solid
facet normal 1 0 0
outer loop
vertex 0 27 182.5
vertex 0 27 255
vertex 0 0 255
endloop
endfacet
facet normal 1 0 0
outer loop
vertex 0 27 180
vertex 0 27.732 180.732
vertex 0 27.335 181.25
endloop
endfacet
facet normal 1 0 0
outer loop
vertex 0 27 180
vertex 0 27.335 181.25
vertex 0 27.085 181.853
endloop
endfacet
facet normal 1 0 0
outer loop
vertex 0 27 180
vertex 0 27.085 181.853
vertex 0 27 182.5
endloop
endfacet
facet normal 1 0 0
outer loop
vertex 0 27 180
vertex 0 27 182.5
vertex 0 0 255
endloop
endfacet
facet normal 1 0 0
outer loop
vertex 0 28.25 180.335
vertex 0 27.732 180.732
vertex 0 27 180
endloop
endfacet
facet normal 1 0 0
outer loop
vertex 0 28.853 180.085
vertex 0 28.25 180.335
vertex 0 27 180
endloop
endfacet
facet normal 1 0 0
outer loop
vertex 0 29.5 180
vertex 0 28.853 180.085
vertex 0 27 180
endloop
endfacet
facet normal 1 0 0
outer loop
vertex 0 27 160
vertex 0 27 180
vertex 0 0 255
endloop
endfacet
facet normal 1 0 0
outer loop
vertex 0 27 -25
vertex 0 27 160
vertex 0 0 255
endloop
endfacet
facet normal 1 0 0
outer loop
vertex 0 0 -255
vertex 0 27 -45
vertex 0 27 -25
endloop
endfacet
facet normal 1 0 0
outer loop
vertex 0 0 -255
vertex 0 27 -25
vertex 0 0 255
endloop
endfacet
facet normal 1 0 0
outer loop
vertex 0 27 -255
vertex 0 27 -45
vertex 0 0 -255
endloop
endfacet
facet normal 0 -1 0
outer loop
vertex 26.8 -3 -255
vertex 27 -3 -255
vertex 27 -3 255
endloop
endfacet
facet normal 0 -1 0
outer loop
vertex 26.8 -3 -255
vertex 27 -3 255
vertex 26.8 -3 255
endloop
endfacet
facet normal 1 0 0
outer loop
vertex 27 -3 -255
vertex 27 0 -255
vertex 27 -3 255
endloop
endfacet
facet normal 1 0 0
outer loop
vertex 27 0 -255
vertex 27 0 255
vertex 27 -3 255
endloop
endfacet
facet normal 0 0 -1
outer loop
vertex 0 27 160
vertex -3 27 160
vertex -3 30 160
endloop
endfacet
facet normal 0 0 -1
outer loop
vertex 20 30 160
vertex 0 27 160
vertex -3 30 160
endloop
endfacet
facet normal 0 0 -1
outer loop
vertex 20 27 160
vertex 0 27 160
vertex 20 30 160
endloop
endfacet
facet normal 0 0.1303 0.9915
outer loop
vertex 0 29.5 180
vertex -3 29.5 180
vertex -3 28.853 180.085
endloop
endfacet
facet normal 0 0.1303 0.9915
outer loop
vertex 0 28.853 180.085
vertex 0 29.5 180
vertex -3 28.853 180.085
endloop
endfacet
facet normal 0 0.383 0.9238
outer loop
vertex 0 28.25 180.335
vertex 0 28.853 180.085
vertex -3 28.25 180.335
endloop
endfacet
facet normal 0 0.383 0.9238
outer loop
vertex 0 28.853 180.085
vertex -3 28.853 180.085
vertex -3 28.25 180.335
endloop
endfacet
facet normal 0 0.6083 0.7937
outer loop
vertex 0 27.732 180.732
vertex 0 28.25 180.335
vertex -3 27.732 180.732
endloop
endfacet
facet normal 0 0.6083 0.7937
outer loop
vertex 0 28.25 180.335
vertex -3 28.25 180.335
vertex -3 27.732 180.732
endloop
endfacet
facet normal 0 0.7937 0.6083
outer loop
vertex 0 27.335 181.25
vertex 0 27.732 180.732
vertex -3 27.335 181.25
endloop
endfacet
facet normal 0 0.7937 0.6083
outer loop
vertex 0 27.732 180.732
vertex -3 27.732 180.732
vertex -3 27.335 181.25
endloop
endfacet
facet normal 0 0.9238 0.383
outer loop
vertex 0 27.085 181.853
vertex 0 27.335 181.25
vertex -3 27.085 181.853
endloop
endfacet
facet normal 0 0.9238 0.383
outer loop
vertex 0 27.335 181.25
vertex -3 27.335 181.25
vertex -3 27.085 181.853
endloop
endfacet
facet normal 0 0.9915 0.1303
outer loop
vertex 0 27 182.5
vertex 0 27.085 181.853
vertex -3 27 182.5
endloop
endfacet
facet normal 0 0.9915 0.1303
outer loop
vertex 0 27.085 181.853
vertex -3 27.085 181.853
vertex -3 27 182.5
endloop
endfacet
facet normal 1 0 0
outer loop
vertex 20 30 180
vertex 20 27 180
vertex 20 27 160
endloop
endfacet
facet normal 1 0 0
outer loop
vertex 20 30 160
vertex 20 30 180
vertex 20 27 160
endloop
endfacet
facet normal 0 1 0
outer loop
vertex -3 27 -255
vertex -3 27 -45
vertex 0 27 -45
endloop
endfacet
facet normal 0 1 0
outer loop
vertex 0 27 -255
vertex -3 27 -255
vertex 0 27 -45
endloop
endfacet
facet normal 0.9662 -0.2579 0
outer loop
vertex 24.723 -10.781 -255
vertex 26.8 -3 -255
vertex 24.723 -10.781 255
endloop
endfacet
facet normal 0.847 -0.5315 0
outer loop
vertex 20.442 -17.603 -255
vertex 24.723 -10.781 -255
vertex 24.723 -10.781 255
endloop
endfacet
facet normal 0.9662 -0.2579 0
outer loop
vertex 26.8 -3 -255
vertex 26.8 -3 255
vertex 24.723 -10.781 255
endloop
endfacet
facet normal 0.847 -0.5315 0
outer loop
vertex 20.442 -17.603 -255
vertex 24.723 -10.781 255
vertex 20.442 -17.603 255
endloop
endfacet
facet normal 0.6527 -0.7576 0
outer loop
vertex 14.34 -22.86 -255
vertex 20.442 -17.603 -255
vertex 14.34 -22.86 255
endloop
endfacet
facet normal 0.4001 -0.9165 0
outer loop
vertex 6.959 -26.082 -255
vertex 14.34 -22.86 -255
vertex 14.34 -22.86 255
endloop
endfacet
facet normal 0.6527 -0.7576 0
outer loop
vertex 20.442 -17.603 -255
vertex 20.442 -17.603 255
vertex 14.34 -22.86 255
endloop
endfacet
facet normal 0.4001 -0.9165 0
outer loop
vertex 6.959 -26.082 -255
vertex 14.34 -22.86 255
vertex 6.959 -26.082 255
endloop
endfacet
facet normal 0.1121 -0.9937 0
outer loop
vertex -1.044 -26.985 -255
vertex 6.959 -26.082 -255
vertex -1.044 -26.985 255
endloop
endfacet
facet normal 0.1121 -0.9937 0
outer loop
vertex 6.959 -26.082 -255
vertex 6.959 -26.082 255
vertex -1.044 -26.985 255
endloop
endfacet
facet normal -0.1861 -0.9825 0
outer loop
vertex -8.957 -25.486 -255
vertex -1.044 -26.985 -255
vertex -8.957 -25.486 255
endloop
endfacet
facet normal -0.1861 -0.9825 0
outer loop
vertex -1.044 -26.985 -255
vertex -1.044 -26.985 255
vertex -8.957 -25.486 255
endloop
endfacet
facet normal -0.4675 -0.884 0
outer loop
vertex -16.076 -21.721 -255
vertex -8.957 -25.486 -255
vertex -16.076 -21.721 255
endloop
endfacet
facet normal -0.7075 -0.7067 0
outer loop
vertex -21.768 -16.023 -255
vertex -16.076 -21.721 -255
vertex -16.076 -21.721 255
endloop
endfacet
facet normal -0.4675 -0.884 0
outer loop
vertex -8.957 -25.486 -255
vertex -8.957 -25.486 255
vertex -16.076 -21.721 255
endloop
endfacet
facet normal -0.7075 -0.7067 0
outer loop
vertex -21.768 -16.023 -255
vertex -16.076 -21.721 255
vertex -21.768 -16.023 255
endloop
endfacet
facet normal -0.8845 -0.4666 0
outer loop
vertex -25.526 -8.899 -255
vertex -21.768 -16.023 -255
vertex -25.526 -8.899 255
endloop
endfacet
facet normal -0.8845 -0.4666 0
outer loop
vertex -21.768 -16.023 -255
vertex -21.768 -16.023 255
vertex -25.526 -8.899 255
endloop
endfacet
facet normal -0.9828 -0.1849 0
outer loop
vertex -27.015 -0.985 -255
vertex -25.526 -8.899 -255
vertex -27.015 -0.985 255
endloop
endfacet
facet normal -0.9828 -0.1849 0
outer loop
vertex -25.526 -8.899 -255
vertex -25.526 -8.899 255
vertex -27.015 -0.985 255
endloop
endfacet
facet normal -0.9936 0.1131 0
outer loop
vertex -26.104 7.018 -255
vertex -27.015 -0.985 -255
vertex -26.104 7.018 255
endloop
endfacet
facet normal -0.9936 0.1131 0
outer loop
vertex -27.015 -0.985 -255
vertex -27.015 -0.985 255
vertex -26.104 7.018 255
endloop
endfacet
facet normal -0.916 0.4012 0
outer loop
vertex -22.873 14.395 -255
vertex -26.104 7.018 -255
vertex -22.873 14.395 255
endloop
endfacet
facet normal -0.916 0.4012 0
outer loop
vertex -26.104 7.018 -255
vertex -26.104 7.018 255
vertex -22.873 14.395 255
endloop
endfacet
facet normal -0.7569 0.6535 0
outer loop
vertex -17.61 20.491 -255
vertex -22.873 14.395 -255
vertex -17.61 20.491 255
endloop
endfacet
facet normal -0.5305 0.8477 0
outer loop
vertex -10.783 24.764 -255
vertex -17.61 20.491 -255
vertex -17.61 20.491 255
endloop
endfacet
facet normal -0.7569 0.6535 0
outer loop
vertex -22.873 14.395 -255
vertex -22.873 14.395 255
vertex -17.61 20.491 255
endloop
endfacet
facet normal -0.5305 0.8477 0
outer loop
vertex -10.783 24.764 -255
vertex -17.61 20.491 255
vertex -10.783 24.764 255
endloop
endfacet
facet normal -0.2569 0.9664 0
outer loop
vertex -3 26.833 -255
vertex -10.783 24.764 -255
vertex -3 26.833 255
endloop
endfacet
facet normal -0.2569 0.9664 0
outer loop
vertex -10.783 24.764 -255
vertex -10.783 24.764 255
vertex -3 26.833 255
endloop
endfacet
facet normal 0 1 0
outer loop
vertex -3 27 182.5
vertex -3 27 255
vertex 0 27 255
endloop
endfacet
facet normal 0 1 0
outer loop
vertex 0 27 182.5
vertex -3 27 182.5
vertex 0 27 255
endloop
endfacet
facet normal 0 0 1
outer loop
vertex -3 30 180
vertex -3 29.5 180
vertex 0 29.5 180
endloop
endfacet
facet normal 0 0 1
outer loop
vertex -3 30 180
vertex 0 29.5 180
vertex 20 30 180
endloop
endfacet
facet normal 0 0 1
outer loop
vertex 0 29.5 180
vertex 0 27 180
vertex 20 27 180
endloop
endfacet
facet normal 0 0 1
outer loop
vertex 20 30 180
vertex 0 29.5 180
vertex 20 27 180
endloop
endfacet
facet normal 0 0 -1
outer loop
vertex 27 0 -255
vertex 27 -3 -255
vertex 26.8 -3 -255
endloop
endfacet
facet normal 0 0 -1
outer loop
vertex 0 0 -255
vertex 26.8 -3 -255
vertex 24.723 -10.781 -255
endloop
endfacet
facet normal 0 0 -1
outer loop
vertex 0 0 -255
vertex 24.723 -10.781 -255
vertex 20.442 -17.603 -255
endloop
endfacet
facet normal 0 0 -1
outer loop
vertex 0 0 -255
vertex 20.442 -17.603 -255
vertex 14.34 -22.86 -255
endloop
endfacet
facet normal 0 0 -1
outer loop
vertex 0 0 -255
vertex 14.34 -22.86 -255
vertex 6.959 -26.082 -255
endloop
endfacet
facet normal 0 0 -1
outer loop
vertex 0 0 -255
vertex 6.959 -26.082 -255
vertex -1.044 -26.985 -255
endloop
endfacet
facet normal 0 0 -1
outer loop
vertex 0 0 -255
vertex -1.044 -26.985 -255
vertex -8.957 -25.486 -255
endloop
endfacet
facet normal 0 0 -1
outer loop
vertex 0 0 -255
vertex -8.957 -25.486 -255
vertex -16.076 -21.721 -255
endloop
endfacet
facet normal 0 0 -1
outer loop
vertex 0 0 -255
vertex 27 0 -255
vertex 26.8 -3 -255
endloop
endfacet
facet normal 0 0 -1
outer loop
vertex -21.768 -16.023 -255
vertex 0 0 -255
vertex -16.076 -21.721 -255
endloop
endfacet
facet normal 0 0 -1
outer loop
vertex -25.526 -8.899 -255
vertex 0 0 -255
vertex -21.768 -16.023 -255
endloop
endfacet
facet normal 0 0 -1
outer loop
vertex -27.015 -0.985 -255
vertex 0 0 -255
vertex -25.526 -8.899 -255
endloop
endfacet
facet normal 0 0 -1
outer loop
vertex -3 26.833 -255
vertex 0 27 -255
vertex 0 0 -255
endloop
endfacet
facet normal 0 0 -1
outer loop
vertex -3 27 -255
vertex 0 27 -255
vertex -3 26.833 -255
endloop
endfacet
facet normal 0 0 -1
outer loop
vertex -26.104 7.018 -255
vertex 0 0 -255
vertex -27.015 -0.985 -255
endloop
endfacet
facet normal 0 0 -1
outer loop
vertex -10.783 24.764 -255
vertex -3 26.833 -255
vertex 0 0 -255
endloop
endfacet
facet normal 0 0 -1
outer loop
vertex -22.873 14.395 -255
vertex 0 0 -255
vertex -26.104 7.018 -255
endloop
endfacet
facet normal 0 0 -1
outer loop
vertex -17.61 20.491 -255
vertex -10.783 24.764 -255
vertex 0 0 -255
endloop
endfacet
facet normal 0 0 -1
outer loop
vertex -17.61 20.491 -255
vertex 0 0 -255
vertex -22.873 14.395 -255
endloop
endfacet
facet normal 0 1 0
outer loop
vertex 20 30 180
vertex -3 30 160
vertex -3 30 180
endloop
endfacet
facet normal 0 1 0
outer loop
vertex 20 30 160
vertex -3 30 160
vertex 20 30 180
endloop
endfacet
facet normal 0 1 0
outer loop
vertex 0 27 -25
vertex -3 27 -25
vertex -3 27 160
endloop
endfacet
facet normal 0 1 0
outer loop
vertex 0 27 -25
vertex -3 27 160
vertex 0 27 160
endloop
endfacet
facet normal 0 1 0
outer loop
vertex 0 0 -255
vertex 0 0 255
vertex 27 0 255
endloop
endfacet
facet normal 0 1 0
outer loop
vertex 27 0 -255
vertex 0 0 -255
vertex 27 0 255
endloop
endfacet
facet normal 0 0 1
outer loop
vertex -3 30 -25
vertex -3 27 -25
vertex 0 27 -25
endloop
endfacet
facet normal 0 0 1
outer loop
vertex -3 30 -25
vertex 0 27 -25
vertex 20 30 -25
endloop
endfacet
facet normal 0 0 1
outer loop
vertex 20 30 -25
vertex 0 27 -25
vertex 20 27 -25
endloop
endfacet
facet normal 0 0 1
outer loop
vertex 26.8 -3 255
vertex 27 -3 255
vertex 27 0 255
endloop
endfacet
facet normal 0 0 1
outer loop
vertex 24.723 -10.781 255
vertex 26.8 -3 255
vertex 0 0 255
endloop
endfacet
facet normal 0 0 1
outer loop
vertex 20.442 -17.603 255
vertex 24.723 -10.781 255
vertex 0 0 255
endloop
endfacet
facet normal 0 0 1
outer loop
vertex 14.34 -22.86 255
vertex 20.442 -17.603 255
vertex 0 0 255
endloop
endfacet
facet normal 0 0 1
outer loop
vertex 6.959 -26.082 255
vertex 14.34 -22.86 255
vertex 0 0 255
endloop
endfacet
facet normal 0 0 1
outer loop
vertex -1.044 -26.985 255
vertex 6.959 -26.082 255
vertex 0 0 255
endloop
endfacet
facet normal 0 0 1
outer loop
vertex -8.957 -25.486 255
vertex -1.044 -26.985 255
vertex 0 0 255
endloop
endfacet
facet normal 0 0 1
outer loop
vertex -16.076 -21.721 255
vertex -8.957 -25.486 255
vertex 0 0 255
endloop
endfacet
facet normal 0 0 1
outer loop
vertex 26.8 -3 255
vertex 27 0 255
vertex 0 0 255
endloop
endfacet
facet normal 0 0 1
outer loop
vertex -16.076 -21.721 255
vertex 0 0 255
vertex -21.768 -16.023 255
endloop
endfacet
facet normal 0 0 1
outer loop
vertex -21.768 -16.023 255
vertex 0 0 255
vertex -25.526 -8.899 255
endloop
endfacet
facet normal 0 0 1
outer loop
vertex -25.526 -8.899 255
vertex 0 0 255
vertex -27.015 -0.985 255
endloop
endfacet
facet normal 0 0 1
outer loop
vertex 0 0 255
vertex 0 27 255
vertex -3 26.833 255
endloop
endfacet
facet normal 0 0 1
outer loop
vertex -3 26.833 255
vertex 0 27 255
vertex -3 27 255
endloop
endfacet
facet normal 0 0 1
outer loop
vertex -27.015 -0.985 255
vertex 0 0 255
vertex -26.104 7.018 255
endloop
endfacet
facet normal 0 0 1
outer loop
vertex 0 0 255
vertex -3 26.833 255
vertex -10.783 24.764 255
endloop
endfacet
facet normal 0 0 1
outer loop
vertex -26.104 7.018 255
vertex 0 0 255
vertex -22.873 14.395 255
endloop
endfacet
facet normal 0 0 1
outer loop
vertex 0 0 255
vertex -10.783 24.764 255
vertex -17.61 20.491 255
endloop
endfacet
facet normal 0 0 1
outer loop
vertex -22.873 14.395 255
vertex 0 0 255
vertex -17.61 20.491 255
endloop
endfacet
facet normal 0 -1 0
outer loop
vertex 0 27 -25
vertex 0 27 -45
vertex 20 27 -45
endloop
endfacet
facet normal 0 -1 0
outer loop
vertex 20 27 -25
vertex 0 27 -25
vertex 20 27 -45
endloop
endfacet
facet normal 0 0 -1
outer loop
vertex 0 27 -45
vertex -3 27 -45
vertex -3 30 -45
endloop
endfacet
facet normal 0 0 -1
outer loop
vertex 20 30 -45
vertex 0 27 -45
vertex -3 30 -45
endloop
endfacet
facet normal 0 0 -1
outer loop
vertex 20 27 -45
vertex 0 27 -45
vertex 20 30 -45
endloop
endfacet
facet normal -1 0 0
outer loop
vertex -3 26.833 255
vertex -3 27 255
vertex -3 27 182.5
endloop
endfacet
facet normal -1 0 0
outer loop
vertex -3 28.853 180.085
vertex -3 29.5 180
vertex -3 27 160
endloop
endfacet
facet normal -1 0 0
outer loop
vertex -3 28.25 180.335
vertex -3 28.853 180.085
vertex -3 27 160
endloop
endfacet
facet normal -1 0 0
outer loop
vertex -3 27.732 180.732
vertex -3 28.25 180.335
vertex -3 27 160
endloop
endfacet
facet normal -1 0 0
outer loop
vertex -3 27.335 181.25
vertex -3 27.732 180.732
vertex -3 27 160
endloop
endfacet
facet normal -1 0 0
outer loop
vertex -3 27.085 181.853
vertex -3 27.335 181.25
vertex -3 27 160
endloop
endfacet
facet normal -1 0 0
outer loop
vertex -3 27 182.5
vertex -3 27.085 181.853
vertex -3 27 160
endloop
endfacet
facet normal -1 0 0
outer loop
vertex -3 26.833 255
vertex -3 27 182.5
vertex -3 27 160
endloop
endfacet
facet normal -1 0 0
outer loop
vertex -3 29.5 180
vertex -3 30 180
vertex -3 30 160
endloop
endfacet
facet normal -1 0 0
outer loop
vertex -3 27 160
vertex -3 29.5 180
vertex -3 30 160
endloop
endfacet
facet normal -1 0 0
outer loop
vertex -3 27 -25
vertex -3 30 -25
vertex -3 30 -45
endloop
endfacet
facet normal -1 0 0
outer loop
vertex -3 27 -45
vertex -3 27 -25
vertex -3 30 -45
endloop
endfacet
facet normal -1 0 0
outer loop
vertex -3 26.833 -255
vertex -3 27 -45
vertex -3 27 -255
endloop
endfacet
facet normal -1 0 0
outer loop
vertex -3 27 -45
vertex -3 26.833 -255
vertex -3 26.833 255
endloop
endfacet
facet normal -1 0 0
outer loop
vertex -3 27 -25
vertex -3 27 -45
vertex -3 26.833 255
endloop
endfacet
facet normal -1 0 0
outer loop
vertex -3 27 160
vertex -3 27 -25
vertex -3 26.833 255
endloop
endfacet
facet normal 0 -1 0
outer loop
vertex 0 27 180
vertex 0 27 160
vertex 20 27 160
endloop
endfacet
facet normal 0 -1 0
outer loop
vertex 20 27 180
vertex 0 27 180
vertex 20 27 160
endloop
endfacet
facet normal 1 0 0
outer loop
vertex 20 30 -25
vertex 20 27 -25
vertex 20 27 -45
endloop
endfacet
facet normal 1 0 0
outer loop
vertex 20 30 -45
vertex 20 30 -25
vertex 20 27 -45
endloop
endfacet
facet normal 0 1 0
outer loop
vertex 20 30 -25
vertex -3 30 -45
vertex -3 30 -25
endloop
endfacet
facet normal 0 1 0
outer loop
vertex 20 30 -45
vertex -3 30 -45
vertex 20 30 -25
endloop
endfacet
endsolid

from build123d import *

# Parameters (mm, degrees)
BOSS_EXTRUDE1_DEPTH = 255
SKETCH5_W           = 23
SKETCH5_H           = 20
BOSS_EXTRUDE2_DEPTH = 3
BOSS_EXTRUDE3_DEPTH = 3


with BuildPart() as part:
    # Sketch4 → Boss-Extrude1 (new, symmetric)
    with BuildSketch(Plane.XY):
        with BuildLine():
            Line((0, 0), (27, 0))
            Line((27, 0), (27, -3))
            Line((27, -3), (26.800082477, -3))
            ThreePointArc((26.800082477, -3), (-19.135504983, -19.08508544), (-3, 26.83281573))
            Line((-3, 26.83281573), (-3, 27))
            Line((-3, 27), (0, 27))
            Line((0, 27), (0, 0))
        make_face()
    extrude(amount=BOSS_EXTRUDE1_DEPTH, both=True)

    # Sketch5 → Boss-Extrude2 (add)
    with BuildSketch(Plane(origin=(0, 27, 0), x_dir=(1, 0, 0), z_dir=(0, 1, 0))):
        with Locations((8.5, -170)):
            Rectangle(SKETCH5_W, SKETCH5_H)
        with Locations((8.5, 35)):
            Rectangle(SKETCH5_W, SKETCH5_H)
    extrude(amount=BOSS_EXTRUDE2_DEPTH)

    # Sketch6 → Boss-Extrude3 (add)
    with BuildSketch(Plane(origin=(-3, 27, 180), x_dir=(0, 0, -1), z_dir=(1, 0, 0))):
        with BuildLine():
            ThreePointArc((0, 2.5), (-0.732233047, 0.732233047), (-2.5, 0))
            Line((-2.5, 0), (0, 0))
            Line((0, 0), (0, 2.5))
        make_face()
    extrude(amount=BOSS_EXTRUDE3_DEPTH)


solid = part.part
